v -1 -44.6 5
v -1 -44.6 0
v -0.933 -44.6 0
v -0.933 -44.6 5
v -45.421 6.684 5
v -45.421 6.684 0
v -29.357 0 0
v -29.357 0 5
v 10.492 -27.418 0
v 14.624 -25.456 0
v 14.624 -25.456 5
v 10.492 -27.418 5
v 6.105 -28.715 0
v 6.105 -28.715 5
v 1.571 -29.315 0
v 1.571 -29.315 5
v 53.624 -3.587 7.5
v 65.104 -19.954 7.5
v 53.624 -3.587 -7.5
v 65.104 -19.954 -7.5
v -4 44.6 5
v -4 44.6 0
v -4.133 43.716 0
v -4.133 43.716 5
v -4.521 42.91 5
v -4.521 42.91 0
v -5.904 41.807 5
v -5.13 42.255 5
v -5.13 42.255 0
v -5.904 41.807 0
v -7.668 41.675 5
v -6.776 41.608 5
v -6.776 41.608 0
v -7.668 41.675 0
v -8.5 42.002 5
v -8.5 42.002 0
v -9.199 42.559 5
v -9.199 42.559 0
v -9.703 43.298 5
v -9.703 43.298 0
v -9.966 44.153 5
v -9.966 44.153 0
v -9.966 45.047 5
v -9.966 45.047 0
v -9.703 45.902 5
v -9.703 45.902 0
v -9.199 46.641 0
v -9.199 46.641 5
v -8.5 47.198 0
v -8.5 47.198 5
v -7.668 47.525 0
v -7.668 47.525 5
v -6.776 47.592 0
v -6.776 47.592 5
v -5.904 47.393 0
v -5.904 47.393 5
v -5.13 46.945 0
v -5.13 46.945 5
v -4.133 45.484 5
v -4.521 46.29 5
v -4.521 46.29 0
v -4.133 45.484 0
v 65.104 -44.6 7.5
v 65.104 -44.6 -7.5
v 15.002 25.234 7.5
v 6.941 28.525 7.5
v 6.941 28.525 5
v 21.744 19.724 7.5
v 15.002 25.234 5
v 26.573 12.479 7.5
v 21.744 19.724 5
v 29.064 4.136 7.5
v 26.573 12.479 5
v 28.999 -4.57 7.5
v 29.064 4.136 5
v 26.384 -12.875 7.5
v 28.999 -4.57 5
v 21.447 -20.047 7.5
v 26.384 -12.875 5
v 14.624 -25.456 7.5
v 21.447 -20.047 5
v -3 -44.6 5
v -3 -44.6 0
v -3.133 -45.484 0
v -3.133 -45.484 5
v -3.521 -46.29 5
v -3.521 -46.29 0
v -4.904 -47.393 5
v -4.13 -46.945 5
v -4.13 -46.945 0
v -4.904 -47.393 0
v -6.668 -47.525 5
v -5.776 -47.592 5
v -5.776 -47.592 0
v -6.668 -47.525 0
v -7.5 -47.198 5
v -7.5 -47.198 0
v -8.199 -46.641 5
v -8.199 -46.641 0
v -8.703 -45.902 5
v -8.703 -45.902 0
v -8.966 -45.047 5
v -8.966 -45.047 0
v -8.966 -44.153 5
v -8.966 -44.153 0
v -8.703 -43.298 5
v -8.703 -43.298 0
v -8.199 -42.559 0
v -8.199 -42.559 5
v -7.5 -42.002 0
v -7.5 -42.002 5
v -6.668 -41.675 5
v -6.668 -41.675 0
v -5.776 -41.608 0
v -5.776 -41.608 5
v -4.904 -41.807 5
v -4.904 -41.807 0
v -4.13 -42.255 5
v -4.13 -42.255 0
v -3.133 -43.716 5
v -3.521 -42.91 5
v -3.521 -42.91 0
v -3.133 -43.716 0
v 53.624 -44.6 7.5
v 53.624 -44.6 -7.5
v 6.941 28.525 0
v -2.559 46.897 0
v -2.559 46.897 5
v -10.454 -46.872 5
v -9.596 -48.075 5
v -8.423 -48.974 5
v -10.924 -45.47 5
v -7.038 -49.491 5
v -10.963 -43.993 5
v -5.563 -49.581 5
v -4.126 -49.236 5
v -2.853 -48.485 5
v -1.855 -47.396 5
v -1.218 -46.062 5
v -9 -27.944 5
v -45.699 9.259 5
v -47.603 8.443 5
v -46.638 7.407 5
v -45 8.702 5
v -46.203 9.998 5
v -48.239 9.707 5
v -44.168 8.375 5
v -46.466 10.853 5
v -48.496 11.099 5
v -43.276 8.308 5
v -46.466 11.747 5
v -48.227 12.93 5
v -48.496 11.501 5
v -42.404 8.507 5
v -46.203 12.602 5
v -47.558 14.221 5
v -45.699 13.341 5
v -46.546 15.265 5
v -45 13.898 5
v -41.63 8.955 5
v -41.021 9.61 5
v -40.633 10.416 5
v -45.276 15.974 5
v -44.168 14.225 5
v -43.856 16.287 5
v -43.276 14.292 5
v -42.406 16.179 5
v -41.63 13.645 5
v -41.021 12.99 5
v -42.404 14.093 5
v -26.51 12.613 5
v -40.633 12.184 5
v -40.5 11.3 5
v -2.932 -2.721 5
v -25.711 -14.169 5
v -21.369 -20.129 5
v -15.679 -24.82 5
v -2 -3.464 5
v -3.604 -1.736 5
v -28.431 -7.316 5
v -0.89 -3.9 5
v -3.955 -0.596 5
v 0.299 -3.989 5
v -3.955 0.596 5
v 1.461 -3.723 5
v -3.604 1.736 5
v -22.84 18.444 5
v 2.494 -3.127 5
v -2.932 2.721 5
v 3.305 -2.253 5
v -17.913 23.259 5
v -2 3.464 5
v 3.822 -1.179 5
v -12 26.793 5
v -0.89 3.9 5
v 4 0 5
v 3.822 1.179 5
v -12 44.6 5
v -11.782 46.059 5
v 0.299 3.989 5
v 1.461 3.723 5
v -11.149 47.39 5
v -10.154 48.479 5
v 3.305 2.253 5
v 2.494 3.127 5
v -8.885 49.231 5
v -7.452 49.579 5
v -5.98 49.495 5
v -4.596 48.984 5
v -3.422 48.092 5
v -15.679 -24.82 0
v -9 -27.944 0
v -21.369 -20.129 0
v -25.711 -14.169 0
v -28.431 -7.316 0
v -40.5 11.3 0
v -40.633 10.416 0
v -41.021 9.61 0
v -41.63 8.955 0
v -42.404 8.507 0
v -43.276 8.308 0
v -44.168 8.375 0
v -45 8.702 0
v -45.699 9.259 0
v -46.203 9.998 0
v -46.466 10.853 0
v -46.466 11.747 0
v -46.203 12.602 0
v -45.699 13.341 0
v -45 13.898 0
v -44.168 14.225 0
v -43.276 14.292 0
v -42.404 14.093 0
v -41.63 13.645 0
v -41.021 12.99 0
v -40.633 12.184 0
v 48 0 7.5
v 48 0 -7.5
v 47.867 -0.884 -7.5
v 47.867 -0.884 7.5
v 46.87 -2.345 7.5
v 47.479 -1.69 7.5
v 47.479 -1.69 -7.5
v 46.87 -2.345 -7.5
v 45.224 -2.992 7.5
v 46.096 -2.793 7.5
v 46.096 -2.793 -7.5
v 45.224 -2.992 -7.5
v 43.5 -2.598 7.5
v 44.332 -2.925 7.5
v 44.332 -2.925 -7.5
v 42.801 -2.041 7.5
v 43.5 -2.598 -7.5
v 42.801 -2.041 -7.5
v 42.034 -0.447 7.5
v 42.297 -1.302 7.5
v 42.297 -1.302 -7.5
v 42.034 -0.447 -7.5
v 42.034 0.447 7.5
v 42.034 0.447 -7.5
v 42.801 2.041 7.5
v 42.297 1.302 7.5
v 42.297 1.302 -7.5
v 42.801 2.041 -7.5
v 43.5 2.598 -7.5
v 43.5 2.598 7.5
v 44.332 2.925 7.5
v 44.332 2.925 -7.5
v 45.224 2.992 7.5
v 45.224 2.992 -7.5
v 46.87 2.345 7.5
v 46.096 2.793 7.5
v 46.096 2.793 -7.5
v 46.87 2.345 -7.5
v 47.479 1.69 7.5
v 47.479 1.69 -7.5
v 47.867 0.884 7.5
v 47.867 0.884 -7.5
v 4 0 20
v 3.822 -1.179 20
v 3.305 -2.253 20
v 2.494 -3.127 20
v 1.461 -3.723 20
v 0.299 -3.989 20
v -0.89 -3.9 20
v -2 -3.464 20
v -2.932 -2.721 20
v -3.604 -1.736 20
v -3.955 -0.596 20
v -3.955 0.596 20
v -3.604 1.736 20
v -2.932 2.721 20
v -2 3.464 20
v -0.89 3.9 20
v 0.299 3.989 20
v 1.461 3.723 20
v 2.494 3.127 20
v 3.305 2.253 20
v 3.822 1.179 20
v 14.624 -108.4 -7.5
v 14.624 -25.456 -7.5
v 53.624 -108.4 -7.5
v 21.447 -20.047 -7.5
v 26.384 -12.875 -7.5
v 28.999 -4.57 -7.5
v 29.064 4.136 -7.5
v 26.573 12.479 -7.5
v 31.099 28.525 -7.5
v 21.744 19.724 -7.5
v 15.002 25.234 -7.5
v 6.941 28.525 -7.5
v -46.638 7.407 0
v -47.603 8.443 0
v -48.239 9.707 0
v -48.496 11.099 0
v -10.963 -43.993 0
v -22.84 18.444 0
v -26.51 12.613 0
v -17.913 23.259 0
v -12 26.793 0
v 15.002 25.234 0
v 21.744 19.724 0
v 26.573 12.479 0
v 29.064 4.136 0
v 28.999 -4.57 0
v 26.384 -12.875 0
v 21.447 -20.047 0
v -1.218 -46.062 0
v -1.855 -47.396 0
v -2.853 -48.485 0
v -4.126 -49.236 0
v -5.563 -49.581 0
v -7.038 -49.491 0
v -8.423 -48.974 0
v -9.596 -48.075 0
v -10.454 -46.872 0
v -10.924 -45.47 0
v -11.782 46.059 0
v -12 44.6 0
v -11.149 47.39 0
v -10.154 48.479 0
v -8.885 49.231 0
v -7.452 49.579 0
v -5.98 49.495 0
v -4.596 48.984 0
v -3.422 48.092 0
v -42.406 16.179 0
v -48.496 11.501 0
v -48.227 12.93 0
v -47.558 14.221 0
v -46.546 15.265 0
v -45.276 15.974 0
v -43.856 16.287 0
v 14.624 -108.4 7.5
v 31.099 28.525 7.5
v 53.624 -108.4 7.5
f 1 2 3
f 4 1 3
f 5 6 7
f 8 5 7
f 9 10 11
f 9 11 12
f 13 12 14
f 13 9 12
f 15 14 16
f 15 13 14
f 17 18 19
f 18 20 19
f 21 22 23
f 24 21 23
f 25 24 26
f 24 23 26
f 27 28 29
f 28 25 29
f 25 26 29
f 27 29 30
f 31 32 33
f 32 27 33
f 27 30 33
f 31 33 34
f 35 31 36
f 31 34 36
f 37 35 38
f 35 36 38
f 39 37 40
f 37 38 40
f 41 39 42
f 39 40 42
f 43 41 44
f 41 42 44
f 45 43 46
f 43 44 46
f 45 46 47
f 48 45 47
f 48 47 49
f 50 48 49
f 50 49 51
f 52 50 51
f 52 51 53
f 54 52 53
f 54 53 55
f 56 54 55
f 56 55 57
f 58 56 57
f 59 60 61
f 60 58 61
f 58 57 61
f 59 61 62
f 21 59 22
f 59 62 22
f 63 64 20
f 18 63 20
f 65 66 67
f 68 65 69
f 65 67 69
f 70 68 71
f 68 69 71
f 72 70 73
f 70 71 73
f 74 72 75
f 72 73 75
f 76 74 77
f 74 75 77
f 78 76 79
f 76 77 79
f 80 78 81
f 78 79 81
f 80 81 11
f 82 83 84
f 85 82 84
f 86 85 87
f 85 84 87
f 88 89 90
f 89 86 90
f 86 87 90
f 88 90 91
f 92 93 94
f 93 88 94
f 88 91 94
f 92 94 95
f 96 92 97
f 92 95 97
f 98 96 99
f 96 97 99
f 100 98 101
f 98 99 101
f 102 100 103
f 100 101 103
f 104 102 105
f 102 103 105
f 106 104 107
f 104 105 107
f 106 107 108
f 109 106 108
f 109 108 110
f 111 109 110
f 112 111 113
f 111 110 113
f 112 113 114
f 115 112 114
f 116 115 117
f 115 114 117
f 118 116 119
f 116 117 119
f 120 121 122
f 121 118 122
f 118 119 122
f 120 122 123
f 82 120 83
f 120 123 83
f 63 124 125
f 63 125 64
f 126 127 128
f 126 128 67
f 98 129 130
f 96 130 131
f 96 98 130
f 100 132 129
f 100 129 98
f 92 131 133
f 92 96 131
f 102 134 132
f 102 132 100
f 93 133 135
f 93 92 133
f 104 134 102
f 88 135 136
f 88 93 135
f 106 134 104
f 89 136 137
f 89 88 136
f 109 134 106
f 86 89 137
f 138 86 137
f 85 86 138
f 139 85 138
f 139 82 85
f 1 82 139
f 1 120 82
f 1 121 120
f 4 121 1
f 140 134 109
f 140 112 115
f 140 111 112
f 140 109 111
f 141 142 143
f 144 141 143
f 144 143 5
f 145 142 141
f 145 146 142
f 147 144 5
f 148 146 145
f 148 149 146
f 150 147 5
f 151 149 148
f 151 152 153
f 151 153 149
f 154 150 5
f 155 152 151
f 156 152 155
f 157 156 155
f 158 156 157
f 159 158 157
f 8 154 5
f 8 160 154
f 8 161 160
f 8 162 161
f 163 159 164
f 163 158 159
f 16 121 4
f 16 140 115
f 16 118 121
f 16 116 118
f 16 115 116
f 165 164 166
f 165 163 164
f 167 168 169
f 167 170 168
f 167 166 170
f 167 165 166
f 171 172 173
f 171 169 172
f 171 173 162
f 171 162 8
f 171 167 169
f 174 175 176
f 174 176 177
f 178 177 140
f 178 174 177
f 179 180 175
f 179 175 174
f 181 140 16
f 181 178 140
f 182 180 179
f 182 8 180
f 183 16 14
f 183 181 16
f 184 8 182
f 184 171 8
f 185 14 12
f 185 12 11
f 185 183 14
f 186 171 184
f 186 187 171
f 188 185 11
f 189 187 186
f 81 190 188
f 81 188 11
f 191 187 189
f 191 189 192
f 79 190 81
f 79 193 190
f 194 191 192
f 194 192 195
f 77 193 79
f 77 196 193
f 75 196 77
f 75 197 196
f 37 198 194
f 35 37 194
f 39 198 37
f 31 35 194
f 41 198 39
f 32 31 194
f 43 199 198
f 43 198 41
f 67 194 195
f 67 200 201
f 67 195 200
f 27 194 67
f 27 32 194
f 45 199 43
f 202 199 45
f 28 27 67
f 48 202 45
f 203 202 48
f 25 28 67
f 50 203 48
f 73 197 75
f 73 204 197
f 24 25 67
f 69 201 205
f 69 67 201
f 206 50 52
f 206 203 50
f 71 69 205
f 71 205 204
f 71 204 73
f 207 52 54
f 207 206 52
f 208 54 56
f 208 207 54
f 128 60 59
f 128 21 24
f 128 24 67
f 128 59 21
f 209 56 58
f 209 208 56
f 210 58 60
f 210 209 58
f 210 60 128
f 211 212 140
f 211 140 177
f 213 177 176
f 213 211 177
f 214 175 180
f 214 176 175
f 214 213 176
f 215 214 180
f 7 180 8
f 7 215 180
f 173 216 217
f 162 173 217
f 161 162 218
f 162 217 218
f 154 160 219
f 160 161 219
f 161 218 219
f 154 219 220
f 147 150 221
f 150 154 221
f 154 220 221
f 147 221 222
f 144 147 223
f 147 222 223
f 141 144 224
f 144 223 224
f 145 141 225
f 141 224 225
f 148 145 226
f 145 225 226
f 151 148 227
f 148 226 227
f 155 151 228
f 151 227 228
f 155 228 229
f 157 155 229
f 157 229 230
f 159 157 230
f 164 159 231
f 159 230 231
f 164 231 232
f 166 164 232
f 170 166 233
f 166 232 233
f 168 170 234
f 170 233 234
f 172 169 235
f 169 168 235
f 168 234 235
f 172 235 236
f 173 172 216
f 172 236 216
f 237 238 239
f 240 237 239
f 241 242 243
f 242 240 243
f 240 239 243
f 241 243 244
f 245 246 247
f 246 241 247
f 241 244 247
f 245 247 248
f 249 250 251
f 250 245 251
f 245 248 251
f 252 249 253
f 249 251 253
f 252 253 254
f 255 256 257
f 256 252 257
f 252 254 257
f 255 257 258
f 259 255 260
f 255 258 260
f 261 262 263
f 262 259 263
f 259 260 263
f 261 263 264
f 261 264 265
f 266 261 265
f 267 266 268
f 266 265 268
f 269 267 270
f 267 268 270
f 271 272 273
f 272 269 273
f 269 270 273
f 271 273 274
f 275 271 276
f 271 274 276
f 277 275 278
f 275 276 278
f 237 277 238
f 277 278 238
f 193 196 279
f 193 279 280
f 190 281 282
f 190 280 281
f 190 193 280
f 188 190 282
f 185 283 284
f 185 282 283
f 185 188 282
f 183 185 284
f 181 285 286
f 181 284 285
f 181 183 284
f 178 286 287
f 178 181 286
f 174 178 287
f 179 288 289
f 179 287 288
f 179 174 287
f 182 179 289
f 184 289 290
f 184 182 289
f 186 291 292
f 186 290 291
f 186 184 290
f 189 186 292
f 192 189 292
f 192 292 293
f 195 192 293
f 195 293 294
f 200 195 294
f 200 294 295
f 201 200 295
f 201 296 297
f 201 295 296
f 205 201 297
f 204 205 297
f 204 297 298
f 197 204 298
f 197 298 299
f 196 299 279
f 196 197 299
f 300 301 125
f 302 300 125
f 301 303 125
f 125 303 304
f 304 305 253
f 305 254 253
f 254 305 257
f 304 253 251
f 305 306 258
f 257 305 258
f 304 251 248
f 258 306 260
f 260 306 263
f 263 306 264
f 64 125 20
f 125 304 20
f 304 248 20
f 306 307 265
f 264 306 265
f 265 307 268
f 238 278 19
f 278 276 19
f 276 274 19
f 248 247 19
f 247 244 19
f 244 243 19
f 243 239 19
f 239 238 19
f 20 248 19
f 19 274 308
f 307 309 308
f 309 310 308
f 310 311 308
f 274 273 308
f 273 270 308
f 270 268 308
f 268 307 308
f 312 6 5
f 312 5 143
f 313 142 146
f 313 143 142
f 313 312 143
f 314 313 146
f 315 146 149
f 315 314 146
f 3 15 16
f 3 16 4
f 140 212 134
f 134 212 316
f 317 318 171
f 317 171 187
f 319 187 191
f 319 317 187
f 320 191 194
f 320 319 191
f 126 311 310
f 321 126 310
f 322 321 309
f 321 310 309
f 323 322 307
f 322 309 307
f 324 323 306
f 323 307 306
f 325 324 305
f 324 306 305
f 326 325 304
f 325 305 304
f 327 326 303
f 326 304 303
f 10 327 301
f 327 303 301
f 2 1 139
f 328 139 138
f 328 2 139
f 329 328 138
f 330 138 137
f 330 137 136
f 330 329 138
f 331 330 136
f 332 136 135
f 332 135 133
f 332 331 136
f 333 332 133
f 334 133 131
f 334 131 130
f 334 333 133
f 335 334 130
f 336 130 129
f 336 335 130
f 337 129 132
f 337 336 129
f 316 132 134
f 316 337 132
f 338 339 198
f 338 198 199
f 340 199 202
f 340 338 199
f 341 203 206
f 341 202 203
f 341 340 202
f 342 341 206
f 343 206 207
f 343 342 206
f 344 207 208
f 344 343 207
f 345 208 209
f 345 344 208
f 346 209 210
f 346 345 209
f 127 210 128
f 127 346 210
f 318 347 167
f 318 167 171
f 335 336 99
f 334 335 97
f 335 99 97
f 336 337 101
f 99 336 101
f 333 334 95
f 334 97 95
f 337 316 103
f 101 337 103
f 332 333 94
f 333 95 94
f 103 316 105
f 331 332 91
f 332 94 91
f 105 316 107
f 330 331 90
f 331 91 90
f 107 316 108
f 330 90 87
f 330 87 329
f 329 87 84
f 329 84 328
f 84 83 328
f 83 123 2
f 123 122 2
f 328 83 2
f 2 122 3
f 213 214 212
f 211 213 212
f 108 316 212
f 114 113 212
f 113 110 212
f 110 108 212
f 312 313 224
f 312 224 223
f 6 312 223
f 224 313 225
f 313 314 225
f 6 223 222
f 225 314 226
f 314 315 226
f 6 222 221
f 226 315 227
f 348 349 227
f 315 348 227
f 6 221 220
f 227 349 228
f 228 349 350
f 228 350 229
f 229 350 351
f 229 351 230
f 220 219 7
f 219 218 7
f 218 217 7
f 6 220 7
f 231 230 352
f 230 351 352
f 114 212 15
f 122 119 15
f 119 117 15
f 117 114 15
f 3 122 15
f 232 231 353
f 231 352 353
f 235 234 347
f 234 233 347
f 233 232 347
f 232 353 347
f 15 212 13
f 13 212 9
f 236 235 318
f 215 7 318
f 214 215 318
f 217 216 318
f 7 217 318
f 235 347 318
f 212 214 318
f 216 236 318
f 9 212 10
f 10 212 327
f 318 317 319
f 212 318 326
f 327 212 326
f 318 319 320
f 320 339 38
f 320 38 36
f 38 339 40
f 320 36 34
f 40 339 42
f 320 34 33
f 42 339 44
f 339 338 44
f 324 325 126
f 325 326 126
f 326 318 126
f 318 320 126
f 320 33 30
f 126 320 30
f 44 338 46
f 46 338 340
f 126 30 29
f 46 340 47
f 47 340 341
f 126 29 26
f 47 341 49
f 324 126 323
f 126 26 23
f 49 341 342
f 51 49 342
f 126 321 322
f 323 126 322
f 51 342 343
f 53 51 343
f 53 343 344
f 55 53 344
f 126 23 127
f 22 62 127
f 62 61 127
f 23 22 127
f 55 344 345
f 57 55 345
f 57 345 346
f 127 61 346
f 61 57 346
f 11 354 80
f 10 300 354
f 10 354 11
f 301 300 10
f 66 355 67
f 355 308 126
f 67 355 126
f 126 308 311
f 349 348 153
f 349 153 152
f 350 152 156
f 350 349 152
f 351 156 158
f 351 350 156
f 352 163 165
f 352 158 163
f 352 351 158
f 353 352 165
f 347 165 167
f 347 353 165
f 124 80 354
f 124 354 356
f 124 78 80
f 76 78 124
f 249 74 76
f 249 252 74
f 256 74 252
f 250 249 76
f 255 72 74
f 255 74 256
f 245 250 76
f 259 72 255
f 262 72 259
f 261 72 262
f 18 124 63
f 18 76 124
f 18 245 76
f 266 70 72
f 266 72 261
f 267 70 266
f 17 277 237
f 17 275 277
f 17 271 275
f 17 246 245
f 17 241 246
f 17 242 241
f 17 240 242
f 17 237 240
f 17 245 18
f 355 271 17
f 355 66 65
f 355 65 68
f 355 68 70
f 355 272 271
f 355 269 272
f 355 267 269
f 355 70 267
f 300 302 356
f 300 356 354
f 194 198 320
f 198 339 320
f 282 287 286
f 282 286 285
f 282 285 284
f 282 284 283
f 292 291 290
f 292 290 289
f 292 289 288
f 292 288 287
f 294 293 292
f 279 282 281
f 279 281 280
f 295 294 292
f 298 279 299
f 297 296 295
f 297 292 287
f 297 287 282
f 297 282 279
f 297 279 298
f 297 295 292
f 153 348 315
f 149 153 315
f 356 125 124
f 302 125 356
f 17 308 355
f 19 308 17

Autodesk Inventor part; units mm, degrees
ref_plane "YZ Plane" through (0, 0, 0) normal (1, 0, 0) x (0, 1, 0)
ref_plane "XZ Plane" through (0, 0, 0) normal (0, 1, 0) x (-1, 0, 0)
ref_plane "XY Plane" through (0, 0, 0) normal (0, 0, 1) x (1, 0, 0)
sketch "Esboço1" plane through (0, 0, 0) normal (0, 0, 1) x (1, 0, 0)
  circle A0 centre (0, 0) radius 4
  circle A1 centre (-7, 44.6) radius 3
  circle A2 centre (45, 0) radius 3
  circle A3 centre (-6, -44.6) radius 3
  circle A4 centre (-43.5, 11.3) radius 3
  circle A5 centre (0, 0) radius 29.3573
  circle A6 centre (-7, 44.6) radius 5
  circle A7 centre (-43.5, 11.3) radius 5
  circle A8 centre (-6, -44.6) radius 5
  circle A9 centre (45, 0) radius 5
  line L0 (-12, 44.6) -> (-12, 26.7927)
  line L1 (40.0933, -0.9613) -> (42.8631, -4.0842)
  line L2 (-2.5586, 46.8966) -> (6.9412, 28.5249)
  line L3 (-45.4208, 6.6836) -> (-29.3573, 0)
  line L4 (-42.4056, 16.1788) -> (-26.5097, 12.6129)
  line L5 (-9, -27.9437) -> (-10.963, -43.993)
  line L6 (1.5707, -29.3152) -> (-1.4137, -47.5322)
  line L7 (14.7039, 28.5249) -> (31.099, 28.5249)
  line L8 (31.099, 28.5249) -> (53.6238, -3.5874)
  line L9 (-48.496, 11.5007) -> (-48.496, 11.0993)
  line L10 (14.6238, -44.6) -> (14.6238, -108.4)
  line L11 (53.6238, -44.6) -> (53.6238, -108.4)
  line L12 (53.6238, -108.4) -> (14.6238, -108.4)
  line L13 (65.104, -44.6) -> (65.104, -19.9542)
  line L14 (65.104, -19.9542) -> (49.0934, 2.8713)
  line L15 (14.6238, -44.6) -> (14.6238, -25.4557)
  line L16 (-6, -44.6) -> (-0.9333, -44.6)
  line L17 (14.6238, -44.6) -> (65.104, -44.6)
  line L18 (14.7039, 28.5249) -> (6.9412, 28.5249)
  point P0 (-1, -44.6)
  dimension "d15" = 10
  dimension "d0" = 8
  dimension "d1" = 44.6
  dimension "d2" = 7
  dimension "d3" = 6
  dimension "d4" = 6
  dimension "d5" = 45
  dimension "d6" = 6
  dimension "d7" = 44.6
  dimension "d8" = 6
  dimension "d9" = 11.3
  dimension "d10" = 6
  dimension "d11" = 37.5
  dimension "d12" = 44.6
  dimension "d13" = 10
  dimension "d14" = 10
  dimension "d16" = 10
  dimension "d17" = 0
extrude "Extrusão1" add sketch "Esboço1" along normal blind 20 contours A0
extrude "Extrusão2" add sketch "Esboço1" along normal blind 5 contours A8 | A8 L5 A5 L6 L16 | A5 | L3 A7 L4 A5 | A7 L9 | L0 A6 L2 A5 | A6 picked at (-39.2458, 10.6554)
extrude "Extrusão3" add sketch "Esboço1" along normal mid plane 15 contours A9 | A5 L18 L7 L8 L14 L13 L17 L15 | L17 L11 L12 L10
properties part number "Motor"
